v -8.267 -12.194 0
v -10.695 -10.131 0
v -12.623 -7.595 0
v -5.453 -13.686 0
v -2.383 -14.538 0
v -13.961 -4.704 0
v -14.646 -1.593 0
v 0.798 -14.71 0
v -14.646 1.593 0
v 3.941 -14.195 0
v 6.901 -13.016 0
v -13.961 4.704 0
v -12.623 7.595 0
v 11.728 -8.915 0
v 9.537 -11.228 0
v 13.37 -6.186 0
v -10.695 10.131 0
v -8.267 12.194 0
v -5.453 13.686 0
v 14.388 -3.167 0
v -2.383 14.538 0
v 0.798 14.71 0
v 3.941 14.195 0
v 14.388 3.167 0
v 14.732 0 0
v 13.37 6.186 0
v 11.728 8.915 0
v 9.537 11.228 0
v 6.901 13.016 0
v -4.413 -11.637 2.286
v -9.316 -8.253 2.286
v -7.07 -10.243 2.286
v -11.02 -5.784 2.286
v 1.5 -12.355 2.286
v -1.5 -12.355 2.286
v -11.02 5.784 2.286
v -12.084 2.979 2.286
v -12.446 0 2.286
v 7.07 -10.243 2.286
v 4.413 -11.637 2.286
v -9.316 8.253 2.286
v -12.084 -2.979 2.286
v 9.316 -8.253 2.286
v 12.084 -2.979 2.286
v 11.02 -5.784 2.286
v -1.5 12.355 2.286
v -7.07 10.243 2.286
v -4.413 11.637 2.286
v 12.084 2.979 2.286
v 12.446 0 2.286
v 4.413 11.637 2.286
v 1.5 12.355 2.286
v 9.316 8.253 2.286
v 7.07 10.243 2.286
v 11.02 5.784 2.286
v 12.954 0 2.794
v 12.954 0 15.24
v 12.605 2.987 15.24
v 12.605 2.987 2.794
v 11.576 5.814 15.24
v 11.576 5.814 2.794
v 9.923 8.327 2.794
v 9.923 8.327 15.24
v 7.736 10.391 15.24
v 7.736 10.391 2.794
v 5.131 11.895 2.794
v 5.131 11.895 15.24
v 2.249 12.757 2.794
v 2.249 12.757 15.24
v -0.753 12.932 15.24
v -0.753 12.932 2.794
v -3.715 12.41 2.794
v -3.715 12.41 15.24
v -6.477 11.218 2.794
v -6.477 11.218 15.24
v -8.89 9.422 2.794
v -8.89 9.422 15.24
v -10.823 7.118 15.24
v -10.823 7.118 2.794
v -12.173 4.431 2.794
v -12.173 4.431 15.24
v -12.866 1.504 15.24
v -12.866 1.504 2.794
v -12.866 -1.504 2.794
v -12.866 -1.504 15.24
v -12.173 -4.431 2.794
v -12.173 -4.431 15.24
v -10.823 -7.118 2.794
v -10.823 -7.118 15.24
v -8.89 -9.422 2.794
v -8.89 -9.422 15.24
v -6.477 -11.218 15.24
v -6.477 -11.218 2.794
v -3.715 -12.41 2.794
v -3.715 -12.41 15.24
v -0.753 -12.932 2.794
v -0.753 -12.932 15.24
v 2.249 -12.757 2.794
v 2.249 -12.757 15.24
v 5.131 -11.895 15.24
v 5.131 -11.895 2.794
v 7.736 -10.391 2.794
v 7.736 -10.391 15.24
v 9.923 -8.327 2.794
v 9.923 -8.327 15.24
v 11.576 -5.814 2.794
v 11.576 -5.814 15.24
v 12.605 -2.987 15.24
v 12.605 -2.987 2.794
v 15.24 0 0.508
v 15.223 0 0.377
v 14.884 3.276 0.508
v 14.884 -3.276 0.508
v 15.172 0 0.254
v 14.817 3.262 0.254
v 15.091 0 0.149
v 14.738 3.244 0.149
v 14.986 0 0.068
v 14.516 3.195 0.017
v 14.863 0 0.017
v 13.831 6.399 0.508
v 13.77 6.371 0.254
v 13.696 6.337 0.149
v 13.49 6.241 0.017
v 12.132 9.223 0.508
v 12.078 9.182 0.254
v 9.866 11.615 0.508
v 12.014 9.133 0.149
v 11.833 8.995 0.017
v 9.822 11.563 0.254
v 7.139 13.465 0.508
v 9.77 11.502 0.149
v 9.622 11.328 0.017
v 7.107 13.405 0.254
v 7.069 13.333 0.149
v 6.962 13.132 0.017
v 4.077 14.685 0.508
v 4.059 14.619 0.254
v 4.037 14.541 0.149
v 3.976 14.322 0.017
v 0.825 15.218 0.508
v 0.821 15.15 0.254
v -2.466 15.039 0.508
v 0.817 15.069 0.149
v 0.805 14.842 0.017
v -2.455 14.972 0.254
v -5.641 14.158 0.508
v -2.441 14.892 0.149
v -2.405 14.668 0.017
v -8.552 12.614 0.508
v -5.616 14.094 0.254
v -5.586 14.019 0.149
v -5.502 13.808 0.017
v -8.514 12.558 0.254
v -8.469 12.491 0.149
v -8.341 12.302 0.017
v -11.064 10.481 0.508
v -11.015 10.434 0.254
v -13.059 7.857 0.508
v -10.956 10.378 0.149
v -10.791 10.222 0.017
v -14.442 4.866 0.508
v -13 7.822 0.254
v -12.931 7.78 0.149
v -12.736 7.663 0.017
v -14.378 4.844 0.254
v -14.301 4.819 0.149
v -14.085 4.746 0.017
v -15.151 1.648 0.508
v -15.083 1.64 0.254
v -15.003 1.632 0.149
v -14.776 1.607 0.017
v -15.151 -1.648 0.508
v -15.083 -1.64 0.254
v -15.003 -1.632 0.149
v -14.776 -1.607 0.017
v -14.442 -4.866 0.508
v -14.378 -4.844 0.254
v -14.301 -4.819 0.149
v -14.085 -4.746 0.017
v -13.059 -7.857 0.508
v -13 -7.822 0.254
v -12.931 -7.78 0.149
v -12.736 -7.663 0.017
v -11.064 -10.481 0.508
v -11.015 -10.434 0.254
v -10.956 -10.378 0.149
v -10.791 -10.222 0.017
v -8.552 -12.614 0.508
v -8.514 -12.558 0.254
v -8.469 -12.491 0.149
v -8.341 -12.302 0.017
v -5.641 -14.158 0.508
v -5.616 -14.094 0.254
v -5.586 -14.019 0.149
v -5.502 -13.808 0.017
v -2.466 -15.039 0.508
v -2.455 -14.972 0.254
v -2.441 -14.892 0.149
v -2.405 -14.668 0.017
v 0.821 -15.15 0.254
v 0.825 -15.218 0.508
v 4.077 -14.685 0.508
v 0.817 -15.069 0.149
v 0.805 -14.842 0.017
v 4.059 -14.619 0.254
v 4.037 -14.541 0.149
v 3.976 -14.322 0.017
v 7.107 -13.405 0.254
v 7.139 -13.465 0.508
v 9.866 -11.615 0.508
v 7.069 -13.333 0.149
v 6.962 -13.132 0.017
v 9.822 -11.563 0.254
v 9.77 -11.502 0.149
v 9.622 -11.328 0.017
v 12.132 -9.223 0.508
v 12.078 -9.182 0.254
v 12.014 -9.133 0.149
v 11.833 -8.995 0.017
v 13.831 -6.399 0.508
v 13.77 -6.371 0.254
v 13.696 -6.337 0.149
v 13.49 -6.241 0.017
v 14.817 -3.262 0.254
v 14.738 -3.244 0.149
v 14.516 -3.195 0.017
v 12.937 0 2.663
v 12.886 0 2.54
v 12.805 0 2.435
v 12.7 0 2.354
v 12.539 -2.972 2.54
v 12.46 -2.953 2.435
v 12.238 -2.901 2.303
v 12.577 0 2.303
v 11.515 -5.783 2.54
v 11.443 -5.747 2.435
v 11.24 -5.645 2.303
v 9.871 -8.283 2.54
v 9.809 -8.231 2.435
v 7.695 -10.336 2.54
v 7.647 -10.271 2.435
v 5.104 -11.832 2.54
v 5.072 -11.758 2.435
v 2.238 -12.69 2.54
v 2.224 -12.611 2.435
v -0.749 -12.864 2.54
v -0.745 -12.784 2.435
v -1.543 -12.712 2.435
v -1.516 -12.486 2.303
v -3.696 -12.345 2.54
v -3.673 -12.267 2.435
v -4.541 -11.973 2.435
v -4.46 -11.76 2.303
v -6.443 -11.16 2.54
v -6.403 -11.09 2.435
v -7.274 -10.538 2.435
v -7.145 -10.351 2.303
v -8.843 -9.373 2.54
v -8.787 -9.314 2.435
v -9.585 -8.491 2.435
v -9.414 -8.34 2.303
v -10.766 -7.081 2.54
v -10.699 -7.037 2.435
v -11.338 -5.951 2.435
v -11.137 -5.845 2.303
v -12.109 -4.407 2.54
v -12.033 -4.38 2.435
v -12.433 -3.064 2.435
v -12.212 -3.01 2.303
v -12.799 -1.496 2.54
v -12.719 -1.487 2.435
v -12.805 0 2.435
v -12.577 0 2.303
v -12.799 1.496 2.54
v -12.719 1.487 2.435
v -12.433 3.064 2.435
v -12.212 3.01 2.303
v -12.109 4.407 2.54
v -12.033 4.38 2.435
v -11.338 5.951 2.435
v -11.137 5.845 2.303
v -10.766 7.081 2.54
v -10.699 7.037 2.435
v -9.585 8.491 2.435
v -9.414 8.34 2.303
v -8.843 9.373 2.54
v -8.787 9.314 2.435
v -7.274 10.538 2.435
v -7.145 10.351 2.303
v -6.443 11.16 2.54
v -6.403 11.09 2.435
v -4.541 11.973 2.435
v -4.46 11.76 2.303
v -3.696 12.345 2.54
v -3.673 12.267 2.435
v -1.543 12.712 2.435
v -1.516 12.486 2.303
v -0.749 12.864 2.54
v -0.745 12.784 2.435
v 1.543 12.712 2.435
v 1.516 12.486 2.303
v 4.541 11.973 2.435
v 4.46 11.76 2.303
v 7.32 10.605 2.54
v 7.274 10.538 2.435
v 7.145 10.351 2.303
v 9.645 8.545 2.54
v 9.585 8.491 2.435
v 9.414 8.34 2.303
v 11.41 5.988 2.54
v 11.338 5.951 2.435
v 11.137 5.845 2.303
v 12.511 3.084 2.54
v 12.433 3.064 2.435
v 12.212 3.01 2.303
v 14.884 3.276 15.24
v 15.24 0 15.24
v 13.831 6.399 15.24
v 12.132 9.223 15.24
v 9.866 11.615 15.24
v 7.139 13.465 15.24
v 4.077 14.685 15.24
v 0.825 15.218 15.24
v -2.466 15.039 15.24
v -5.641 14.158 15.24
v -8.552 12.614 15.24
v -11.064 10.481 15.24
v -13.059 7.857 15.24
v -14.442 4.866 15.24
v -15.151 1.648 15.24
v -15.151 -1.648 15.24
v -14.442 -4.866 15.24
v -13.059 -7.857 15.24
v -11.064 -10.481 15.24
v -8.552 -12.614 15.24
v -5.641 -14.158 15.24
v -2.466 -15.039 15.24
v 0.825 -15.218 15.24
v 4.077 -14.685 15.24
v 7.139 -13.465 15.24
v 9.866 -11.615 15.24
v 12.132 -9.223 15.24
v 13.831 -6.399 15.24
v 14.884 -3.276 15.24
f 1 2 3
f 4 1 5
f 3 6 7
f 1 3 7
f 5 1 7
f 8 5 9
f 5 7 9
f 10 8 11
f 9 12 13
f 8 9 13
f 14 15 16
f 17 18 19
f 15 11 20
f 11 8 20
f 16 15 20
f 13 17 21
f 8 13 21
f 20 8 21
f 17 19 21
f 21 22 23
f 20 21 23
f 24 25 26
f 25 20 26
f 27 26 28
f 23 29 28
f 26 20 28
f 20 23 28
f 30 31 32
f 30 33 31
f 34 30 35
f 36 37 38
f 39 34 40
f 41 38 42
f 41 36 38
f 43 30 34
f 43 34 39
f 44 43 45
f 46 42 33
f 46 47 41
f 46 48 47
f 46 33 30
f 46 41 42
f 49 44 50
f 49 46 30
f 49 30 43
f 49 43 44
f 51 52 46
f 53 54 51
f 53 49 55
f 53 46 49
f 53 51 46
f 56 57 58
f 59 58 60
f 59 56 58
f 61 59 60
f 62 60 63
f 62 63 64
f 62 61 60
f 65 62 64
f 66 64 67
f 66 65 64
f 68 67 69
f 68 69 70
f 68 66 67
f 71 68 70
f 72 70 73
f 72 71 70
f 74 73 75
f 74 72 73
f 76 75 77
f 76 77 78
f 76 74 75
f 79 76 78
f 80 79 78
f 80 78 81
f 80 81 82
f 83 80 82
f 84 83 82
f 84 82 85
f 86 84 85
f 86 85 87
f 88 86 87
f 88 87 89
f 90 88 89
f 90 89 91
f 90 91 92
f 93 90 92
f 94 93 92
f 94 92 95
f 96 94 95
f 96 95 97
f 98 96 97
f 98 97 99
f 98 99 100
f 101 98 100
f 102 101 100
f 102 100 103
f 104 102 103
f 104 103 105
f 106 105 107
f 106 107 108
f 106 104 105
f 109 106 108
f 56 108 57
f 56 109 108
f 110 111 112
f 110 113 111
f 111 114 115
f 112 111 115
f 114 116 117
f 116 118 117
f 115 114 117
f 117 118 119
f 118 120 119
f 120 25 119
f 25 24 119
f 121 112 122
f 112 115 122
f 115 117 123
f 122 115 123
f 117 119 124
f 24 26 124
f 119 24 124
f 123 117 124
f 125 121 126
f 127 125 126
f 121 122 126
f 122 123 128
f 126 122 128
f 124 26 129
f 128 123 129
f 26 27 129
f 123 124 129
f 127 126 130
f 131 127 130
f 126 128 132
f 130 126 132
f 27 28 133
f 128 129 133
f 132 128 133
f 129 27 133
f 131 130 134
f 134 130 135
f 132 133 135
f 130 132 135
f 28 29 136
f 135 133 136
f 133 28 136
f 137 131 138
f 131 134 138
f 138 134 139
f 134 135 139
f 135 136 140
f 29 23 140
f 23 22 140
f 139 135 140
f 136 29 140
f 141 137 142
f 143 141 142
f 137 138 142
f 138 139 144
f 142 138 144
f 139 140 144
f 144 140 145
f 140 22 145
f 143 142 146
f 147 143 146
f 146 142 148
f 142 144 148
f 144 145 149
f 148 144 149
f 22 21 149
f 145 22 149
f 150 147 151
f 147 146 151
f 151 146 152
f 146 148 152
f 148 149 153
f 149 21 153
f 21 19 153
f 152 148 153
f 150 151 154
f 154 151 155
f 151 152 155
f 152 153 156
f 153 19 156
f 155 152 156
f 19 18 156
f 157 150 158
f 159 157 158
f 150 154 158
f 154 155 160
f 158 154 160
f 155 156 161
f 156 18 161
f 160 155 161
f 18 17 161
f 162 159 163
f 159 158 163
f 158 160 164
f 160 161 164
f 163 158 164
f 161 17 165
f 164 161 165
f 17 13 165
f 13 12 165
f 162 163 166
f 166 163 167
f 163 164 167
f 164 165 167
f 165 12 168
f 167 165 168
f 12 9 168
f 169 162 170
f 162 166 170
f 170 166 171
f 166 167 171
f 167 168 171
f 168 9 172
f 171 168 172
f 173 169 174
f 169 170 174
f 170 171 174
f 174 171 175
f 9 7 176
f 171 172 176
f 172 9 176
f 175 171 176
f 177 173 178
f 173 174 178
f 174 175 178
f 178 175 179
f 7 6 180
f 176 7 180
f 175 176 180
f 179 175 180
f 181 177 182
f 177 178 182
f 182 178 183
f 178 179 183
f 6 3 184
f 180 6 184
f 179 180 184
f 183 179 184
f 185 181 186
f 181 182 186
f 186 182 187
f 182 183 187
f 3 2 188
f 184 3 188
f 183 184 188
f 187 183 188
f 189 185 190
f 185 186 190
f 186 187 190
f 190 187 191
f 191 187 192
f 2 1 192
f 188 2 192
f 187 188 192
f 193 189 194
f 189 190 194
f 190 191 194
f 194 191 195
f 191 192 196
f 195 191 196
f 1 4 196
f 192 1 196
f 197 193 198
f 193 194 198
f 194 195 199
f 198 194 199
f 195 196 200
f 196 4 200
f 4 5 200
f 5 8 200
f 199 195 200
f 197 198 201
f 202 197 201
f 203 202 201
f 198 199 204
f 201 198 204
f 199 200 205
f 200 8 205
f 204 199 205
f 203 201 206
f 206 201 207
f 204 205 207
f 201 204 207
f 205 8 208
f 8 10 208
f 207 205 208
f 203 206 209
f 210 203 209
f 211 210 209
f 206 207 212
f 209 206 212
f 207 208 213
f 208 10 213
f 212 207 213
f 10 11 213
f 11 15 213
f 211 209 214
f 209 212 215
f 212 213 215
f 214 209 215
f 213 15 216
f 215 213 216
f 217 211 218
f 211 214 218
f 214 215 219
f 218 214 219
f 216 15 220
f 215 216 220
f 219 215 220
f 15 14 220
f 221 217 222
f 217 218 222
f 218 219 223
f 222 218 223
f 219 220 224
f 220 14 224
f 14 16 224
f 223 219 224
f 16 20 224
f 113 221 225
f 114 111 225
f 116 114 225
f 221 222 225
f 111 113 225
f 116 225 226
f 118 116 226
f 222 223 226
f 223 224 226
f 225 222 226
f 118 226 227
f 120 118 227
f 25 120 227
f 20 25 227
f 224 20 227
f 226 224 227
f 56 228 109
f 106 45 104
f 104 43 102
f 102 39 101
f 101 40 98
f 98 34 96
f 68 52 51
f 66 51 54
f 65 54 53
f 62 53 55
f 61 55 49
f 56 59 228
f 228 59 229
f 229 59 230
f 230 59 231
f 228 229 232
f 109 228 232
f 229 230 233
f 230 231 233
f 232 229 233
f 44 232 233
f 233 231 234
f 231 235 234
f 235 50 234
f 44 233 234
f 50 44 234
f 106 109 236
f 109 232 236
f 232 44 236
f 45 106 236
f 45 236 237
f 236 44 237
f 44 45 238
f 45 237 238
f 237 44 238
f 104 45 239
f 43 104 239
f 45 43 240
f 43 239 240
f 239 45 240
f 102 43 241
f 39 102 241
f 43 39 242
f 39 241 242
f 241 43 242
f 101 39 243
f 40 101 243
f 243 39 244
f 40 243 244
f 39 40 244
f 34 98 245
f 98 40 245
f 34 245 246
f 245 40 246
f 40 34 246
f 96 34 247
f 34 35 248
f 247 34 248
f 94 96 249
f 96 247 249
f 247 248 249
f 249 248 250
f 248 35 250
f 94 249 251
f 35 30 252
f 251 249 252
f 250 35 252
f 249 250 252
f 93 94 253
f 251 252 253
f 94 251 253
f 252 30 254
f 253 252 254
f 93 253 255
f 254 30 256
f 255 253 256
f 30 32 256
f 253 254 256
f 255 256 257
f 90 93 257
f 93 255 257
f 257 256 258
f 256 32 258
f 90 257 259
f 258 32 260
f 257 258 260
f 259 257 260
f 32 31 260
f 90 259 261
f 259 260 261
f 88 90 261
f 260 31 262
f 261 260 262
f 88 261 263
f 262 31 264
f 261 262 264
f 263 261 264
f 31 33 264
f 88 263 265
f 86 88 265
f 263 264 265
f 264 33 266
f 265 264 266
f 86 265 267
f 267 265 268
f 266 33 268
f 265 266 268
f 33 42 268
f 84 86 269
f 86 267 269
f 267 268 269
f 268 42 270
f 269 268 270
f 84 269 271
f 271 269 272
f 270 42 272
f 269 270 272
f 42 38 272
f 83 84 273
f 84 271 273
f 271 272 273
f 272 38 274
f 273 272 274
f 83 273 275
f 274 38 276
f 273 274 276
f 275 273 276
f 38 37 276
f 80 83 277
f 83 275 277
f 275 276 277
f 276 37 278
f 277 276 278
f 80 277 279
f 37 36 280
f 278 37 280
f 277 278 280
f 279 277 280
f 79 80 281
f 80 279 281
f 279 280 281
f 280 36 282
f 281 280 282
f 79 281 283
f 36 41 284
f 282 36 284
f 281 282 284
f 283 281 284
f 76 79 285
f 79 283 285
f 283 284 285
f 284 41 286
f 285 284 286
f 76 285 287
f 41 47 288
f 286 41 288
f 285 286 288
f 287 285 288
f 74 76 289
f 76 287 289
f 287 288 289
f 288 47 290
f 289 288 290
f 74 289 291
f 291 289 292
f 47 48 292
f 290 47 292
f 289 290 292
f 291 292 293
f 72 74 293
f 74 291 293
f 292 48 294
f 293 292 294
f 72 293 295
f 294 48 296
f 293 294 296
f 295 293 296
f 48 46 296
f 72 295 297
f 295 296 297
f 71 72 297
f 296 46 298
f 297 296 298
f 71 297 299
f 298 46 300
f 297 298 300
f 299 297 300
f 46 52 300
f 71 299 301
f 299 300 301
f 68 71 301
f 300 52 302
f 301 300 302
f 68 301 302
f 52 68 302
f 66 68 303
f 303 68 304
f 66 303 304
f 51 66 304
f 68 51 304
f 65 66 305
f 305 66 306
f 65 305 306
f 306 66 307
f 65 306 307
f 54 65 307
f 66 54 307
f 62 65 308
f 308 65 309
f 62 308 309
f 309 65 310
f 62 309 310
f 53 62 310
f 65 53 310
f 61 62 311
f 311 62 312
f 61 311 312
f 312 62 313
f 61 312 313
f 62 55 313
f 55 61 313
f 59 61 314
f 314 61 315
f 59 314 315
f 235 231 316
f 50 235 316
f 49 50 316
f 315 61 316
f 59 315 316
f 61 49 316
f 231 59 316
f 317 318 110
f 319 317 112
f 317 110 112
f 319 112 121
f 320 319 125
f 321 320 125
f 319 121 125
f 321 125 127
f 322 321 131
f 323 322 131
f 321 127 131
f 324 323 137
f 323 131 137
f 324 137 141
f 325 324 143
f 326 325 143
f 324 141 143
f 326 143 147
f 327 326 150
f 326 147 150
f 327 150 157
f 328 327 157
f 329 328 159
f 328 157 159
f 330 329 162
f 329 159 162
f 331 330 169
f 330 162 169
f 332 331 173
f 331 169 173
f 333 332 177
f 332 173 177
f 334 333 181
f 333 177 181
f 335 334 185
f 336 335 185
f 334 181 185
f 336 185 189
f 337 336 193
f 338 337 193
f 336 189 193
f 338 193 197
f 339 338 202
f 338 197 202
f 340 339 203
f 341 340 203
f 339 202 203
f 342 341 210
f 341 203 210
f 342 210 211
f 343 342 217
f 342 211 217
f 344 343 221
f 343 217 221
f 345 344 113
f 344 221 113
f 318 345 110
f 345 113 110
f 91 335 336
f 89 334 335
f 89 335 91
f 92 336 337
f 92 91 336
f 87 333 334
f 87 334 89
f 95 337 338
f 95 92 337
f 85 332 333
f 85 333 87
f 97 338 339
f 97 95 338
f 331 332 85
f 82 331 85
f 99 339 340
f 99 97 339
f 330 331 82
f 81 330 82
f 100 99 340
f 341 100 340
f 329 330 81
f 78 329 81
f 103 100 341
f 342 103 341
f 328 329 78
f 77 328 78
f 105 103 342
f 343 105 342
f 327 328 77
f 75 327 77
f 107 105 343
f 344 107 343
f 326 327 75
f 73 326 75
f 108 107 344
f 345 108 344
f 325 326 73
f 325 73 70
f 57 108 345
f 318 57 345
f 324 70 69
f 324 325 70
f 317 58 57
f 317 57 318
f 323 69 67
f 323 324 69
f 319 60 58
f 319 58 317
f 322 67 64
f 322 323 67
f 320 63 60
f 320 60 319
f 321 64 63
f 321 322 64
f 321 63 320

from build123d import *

# Parameters (mm, degrees)
F0_R     = 15.24
F1_DEPTH = 15.24
F2_T     = -2.286
F3_R     = 0.508
F4_R     = 0.508


with BuildPart() as f1:
    # F0 (on Top) → F1 (new body)
    with BuildSketch(Plane.XY):
        Circle(F0_R)
    extrude(amount=F1_DEPTH)

    # F2
    f2_openings = [f1.faces().sort_by_distance(p)[0] for p in [
        (0, 0, 15.24),
    ]]
    offset(amount=F2_T, openings=f2_openings)

    # F3
    f3_edges = [f1.edges().sort_by_distance(p)[0] for p in [
        (-12.954, 0, 2.286),
    ]]
    fillet(f3_edges, radius=F3_R)

    # F4
    f4_edges = [f1.edges().sort_by_distance(p)[0] for p in [
        (-15.24, 0, 0),
    ]]
    fillet(f4_edges, radius=F4_R)


solid = f1.part
